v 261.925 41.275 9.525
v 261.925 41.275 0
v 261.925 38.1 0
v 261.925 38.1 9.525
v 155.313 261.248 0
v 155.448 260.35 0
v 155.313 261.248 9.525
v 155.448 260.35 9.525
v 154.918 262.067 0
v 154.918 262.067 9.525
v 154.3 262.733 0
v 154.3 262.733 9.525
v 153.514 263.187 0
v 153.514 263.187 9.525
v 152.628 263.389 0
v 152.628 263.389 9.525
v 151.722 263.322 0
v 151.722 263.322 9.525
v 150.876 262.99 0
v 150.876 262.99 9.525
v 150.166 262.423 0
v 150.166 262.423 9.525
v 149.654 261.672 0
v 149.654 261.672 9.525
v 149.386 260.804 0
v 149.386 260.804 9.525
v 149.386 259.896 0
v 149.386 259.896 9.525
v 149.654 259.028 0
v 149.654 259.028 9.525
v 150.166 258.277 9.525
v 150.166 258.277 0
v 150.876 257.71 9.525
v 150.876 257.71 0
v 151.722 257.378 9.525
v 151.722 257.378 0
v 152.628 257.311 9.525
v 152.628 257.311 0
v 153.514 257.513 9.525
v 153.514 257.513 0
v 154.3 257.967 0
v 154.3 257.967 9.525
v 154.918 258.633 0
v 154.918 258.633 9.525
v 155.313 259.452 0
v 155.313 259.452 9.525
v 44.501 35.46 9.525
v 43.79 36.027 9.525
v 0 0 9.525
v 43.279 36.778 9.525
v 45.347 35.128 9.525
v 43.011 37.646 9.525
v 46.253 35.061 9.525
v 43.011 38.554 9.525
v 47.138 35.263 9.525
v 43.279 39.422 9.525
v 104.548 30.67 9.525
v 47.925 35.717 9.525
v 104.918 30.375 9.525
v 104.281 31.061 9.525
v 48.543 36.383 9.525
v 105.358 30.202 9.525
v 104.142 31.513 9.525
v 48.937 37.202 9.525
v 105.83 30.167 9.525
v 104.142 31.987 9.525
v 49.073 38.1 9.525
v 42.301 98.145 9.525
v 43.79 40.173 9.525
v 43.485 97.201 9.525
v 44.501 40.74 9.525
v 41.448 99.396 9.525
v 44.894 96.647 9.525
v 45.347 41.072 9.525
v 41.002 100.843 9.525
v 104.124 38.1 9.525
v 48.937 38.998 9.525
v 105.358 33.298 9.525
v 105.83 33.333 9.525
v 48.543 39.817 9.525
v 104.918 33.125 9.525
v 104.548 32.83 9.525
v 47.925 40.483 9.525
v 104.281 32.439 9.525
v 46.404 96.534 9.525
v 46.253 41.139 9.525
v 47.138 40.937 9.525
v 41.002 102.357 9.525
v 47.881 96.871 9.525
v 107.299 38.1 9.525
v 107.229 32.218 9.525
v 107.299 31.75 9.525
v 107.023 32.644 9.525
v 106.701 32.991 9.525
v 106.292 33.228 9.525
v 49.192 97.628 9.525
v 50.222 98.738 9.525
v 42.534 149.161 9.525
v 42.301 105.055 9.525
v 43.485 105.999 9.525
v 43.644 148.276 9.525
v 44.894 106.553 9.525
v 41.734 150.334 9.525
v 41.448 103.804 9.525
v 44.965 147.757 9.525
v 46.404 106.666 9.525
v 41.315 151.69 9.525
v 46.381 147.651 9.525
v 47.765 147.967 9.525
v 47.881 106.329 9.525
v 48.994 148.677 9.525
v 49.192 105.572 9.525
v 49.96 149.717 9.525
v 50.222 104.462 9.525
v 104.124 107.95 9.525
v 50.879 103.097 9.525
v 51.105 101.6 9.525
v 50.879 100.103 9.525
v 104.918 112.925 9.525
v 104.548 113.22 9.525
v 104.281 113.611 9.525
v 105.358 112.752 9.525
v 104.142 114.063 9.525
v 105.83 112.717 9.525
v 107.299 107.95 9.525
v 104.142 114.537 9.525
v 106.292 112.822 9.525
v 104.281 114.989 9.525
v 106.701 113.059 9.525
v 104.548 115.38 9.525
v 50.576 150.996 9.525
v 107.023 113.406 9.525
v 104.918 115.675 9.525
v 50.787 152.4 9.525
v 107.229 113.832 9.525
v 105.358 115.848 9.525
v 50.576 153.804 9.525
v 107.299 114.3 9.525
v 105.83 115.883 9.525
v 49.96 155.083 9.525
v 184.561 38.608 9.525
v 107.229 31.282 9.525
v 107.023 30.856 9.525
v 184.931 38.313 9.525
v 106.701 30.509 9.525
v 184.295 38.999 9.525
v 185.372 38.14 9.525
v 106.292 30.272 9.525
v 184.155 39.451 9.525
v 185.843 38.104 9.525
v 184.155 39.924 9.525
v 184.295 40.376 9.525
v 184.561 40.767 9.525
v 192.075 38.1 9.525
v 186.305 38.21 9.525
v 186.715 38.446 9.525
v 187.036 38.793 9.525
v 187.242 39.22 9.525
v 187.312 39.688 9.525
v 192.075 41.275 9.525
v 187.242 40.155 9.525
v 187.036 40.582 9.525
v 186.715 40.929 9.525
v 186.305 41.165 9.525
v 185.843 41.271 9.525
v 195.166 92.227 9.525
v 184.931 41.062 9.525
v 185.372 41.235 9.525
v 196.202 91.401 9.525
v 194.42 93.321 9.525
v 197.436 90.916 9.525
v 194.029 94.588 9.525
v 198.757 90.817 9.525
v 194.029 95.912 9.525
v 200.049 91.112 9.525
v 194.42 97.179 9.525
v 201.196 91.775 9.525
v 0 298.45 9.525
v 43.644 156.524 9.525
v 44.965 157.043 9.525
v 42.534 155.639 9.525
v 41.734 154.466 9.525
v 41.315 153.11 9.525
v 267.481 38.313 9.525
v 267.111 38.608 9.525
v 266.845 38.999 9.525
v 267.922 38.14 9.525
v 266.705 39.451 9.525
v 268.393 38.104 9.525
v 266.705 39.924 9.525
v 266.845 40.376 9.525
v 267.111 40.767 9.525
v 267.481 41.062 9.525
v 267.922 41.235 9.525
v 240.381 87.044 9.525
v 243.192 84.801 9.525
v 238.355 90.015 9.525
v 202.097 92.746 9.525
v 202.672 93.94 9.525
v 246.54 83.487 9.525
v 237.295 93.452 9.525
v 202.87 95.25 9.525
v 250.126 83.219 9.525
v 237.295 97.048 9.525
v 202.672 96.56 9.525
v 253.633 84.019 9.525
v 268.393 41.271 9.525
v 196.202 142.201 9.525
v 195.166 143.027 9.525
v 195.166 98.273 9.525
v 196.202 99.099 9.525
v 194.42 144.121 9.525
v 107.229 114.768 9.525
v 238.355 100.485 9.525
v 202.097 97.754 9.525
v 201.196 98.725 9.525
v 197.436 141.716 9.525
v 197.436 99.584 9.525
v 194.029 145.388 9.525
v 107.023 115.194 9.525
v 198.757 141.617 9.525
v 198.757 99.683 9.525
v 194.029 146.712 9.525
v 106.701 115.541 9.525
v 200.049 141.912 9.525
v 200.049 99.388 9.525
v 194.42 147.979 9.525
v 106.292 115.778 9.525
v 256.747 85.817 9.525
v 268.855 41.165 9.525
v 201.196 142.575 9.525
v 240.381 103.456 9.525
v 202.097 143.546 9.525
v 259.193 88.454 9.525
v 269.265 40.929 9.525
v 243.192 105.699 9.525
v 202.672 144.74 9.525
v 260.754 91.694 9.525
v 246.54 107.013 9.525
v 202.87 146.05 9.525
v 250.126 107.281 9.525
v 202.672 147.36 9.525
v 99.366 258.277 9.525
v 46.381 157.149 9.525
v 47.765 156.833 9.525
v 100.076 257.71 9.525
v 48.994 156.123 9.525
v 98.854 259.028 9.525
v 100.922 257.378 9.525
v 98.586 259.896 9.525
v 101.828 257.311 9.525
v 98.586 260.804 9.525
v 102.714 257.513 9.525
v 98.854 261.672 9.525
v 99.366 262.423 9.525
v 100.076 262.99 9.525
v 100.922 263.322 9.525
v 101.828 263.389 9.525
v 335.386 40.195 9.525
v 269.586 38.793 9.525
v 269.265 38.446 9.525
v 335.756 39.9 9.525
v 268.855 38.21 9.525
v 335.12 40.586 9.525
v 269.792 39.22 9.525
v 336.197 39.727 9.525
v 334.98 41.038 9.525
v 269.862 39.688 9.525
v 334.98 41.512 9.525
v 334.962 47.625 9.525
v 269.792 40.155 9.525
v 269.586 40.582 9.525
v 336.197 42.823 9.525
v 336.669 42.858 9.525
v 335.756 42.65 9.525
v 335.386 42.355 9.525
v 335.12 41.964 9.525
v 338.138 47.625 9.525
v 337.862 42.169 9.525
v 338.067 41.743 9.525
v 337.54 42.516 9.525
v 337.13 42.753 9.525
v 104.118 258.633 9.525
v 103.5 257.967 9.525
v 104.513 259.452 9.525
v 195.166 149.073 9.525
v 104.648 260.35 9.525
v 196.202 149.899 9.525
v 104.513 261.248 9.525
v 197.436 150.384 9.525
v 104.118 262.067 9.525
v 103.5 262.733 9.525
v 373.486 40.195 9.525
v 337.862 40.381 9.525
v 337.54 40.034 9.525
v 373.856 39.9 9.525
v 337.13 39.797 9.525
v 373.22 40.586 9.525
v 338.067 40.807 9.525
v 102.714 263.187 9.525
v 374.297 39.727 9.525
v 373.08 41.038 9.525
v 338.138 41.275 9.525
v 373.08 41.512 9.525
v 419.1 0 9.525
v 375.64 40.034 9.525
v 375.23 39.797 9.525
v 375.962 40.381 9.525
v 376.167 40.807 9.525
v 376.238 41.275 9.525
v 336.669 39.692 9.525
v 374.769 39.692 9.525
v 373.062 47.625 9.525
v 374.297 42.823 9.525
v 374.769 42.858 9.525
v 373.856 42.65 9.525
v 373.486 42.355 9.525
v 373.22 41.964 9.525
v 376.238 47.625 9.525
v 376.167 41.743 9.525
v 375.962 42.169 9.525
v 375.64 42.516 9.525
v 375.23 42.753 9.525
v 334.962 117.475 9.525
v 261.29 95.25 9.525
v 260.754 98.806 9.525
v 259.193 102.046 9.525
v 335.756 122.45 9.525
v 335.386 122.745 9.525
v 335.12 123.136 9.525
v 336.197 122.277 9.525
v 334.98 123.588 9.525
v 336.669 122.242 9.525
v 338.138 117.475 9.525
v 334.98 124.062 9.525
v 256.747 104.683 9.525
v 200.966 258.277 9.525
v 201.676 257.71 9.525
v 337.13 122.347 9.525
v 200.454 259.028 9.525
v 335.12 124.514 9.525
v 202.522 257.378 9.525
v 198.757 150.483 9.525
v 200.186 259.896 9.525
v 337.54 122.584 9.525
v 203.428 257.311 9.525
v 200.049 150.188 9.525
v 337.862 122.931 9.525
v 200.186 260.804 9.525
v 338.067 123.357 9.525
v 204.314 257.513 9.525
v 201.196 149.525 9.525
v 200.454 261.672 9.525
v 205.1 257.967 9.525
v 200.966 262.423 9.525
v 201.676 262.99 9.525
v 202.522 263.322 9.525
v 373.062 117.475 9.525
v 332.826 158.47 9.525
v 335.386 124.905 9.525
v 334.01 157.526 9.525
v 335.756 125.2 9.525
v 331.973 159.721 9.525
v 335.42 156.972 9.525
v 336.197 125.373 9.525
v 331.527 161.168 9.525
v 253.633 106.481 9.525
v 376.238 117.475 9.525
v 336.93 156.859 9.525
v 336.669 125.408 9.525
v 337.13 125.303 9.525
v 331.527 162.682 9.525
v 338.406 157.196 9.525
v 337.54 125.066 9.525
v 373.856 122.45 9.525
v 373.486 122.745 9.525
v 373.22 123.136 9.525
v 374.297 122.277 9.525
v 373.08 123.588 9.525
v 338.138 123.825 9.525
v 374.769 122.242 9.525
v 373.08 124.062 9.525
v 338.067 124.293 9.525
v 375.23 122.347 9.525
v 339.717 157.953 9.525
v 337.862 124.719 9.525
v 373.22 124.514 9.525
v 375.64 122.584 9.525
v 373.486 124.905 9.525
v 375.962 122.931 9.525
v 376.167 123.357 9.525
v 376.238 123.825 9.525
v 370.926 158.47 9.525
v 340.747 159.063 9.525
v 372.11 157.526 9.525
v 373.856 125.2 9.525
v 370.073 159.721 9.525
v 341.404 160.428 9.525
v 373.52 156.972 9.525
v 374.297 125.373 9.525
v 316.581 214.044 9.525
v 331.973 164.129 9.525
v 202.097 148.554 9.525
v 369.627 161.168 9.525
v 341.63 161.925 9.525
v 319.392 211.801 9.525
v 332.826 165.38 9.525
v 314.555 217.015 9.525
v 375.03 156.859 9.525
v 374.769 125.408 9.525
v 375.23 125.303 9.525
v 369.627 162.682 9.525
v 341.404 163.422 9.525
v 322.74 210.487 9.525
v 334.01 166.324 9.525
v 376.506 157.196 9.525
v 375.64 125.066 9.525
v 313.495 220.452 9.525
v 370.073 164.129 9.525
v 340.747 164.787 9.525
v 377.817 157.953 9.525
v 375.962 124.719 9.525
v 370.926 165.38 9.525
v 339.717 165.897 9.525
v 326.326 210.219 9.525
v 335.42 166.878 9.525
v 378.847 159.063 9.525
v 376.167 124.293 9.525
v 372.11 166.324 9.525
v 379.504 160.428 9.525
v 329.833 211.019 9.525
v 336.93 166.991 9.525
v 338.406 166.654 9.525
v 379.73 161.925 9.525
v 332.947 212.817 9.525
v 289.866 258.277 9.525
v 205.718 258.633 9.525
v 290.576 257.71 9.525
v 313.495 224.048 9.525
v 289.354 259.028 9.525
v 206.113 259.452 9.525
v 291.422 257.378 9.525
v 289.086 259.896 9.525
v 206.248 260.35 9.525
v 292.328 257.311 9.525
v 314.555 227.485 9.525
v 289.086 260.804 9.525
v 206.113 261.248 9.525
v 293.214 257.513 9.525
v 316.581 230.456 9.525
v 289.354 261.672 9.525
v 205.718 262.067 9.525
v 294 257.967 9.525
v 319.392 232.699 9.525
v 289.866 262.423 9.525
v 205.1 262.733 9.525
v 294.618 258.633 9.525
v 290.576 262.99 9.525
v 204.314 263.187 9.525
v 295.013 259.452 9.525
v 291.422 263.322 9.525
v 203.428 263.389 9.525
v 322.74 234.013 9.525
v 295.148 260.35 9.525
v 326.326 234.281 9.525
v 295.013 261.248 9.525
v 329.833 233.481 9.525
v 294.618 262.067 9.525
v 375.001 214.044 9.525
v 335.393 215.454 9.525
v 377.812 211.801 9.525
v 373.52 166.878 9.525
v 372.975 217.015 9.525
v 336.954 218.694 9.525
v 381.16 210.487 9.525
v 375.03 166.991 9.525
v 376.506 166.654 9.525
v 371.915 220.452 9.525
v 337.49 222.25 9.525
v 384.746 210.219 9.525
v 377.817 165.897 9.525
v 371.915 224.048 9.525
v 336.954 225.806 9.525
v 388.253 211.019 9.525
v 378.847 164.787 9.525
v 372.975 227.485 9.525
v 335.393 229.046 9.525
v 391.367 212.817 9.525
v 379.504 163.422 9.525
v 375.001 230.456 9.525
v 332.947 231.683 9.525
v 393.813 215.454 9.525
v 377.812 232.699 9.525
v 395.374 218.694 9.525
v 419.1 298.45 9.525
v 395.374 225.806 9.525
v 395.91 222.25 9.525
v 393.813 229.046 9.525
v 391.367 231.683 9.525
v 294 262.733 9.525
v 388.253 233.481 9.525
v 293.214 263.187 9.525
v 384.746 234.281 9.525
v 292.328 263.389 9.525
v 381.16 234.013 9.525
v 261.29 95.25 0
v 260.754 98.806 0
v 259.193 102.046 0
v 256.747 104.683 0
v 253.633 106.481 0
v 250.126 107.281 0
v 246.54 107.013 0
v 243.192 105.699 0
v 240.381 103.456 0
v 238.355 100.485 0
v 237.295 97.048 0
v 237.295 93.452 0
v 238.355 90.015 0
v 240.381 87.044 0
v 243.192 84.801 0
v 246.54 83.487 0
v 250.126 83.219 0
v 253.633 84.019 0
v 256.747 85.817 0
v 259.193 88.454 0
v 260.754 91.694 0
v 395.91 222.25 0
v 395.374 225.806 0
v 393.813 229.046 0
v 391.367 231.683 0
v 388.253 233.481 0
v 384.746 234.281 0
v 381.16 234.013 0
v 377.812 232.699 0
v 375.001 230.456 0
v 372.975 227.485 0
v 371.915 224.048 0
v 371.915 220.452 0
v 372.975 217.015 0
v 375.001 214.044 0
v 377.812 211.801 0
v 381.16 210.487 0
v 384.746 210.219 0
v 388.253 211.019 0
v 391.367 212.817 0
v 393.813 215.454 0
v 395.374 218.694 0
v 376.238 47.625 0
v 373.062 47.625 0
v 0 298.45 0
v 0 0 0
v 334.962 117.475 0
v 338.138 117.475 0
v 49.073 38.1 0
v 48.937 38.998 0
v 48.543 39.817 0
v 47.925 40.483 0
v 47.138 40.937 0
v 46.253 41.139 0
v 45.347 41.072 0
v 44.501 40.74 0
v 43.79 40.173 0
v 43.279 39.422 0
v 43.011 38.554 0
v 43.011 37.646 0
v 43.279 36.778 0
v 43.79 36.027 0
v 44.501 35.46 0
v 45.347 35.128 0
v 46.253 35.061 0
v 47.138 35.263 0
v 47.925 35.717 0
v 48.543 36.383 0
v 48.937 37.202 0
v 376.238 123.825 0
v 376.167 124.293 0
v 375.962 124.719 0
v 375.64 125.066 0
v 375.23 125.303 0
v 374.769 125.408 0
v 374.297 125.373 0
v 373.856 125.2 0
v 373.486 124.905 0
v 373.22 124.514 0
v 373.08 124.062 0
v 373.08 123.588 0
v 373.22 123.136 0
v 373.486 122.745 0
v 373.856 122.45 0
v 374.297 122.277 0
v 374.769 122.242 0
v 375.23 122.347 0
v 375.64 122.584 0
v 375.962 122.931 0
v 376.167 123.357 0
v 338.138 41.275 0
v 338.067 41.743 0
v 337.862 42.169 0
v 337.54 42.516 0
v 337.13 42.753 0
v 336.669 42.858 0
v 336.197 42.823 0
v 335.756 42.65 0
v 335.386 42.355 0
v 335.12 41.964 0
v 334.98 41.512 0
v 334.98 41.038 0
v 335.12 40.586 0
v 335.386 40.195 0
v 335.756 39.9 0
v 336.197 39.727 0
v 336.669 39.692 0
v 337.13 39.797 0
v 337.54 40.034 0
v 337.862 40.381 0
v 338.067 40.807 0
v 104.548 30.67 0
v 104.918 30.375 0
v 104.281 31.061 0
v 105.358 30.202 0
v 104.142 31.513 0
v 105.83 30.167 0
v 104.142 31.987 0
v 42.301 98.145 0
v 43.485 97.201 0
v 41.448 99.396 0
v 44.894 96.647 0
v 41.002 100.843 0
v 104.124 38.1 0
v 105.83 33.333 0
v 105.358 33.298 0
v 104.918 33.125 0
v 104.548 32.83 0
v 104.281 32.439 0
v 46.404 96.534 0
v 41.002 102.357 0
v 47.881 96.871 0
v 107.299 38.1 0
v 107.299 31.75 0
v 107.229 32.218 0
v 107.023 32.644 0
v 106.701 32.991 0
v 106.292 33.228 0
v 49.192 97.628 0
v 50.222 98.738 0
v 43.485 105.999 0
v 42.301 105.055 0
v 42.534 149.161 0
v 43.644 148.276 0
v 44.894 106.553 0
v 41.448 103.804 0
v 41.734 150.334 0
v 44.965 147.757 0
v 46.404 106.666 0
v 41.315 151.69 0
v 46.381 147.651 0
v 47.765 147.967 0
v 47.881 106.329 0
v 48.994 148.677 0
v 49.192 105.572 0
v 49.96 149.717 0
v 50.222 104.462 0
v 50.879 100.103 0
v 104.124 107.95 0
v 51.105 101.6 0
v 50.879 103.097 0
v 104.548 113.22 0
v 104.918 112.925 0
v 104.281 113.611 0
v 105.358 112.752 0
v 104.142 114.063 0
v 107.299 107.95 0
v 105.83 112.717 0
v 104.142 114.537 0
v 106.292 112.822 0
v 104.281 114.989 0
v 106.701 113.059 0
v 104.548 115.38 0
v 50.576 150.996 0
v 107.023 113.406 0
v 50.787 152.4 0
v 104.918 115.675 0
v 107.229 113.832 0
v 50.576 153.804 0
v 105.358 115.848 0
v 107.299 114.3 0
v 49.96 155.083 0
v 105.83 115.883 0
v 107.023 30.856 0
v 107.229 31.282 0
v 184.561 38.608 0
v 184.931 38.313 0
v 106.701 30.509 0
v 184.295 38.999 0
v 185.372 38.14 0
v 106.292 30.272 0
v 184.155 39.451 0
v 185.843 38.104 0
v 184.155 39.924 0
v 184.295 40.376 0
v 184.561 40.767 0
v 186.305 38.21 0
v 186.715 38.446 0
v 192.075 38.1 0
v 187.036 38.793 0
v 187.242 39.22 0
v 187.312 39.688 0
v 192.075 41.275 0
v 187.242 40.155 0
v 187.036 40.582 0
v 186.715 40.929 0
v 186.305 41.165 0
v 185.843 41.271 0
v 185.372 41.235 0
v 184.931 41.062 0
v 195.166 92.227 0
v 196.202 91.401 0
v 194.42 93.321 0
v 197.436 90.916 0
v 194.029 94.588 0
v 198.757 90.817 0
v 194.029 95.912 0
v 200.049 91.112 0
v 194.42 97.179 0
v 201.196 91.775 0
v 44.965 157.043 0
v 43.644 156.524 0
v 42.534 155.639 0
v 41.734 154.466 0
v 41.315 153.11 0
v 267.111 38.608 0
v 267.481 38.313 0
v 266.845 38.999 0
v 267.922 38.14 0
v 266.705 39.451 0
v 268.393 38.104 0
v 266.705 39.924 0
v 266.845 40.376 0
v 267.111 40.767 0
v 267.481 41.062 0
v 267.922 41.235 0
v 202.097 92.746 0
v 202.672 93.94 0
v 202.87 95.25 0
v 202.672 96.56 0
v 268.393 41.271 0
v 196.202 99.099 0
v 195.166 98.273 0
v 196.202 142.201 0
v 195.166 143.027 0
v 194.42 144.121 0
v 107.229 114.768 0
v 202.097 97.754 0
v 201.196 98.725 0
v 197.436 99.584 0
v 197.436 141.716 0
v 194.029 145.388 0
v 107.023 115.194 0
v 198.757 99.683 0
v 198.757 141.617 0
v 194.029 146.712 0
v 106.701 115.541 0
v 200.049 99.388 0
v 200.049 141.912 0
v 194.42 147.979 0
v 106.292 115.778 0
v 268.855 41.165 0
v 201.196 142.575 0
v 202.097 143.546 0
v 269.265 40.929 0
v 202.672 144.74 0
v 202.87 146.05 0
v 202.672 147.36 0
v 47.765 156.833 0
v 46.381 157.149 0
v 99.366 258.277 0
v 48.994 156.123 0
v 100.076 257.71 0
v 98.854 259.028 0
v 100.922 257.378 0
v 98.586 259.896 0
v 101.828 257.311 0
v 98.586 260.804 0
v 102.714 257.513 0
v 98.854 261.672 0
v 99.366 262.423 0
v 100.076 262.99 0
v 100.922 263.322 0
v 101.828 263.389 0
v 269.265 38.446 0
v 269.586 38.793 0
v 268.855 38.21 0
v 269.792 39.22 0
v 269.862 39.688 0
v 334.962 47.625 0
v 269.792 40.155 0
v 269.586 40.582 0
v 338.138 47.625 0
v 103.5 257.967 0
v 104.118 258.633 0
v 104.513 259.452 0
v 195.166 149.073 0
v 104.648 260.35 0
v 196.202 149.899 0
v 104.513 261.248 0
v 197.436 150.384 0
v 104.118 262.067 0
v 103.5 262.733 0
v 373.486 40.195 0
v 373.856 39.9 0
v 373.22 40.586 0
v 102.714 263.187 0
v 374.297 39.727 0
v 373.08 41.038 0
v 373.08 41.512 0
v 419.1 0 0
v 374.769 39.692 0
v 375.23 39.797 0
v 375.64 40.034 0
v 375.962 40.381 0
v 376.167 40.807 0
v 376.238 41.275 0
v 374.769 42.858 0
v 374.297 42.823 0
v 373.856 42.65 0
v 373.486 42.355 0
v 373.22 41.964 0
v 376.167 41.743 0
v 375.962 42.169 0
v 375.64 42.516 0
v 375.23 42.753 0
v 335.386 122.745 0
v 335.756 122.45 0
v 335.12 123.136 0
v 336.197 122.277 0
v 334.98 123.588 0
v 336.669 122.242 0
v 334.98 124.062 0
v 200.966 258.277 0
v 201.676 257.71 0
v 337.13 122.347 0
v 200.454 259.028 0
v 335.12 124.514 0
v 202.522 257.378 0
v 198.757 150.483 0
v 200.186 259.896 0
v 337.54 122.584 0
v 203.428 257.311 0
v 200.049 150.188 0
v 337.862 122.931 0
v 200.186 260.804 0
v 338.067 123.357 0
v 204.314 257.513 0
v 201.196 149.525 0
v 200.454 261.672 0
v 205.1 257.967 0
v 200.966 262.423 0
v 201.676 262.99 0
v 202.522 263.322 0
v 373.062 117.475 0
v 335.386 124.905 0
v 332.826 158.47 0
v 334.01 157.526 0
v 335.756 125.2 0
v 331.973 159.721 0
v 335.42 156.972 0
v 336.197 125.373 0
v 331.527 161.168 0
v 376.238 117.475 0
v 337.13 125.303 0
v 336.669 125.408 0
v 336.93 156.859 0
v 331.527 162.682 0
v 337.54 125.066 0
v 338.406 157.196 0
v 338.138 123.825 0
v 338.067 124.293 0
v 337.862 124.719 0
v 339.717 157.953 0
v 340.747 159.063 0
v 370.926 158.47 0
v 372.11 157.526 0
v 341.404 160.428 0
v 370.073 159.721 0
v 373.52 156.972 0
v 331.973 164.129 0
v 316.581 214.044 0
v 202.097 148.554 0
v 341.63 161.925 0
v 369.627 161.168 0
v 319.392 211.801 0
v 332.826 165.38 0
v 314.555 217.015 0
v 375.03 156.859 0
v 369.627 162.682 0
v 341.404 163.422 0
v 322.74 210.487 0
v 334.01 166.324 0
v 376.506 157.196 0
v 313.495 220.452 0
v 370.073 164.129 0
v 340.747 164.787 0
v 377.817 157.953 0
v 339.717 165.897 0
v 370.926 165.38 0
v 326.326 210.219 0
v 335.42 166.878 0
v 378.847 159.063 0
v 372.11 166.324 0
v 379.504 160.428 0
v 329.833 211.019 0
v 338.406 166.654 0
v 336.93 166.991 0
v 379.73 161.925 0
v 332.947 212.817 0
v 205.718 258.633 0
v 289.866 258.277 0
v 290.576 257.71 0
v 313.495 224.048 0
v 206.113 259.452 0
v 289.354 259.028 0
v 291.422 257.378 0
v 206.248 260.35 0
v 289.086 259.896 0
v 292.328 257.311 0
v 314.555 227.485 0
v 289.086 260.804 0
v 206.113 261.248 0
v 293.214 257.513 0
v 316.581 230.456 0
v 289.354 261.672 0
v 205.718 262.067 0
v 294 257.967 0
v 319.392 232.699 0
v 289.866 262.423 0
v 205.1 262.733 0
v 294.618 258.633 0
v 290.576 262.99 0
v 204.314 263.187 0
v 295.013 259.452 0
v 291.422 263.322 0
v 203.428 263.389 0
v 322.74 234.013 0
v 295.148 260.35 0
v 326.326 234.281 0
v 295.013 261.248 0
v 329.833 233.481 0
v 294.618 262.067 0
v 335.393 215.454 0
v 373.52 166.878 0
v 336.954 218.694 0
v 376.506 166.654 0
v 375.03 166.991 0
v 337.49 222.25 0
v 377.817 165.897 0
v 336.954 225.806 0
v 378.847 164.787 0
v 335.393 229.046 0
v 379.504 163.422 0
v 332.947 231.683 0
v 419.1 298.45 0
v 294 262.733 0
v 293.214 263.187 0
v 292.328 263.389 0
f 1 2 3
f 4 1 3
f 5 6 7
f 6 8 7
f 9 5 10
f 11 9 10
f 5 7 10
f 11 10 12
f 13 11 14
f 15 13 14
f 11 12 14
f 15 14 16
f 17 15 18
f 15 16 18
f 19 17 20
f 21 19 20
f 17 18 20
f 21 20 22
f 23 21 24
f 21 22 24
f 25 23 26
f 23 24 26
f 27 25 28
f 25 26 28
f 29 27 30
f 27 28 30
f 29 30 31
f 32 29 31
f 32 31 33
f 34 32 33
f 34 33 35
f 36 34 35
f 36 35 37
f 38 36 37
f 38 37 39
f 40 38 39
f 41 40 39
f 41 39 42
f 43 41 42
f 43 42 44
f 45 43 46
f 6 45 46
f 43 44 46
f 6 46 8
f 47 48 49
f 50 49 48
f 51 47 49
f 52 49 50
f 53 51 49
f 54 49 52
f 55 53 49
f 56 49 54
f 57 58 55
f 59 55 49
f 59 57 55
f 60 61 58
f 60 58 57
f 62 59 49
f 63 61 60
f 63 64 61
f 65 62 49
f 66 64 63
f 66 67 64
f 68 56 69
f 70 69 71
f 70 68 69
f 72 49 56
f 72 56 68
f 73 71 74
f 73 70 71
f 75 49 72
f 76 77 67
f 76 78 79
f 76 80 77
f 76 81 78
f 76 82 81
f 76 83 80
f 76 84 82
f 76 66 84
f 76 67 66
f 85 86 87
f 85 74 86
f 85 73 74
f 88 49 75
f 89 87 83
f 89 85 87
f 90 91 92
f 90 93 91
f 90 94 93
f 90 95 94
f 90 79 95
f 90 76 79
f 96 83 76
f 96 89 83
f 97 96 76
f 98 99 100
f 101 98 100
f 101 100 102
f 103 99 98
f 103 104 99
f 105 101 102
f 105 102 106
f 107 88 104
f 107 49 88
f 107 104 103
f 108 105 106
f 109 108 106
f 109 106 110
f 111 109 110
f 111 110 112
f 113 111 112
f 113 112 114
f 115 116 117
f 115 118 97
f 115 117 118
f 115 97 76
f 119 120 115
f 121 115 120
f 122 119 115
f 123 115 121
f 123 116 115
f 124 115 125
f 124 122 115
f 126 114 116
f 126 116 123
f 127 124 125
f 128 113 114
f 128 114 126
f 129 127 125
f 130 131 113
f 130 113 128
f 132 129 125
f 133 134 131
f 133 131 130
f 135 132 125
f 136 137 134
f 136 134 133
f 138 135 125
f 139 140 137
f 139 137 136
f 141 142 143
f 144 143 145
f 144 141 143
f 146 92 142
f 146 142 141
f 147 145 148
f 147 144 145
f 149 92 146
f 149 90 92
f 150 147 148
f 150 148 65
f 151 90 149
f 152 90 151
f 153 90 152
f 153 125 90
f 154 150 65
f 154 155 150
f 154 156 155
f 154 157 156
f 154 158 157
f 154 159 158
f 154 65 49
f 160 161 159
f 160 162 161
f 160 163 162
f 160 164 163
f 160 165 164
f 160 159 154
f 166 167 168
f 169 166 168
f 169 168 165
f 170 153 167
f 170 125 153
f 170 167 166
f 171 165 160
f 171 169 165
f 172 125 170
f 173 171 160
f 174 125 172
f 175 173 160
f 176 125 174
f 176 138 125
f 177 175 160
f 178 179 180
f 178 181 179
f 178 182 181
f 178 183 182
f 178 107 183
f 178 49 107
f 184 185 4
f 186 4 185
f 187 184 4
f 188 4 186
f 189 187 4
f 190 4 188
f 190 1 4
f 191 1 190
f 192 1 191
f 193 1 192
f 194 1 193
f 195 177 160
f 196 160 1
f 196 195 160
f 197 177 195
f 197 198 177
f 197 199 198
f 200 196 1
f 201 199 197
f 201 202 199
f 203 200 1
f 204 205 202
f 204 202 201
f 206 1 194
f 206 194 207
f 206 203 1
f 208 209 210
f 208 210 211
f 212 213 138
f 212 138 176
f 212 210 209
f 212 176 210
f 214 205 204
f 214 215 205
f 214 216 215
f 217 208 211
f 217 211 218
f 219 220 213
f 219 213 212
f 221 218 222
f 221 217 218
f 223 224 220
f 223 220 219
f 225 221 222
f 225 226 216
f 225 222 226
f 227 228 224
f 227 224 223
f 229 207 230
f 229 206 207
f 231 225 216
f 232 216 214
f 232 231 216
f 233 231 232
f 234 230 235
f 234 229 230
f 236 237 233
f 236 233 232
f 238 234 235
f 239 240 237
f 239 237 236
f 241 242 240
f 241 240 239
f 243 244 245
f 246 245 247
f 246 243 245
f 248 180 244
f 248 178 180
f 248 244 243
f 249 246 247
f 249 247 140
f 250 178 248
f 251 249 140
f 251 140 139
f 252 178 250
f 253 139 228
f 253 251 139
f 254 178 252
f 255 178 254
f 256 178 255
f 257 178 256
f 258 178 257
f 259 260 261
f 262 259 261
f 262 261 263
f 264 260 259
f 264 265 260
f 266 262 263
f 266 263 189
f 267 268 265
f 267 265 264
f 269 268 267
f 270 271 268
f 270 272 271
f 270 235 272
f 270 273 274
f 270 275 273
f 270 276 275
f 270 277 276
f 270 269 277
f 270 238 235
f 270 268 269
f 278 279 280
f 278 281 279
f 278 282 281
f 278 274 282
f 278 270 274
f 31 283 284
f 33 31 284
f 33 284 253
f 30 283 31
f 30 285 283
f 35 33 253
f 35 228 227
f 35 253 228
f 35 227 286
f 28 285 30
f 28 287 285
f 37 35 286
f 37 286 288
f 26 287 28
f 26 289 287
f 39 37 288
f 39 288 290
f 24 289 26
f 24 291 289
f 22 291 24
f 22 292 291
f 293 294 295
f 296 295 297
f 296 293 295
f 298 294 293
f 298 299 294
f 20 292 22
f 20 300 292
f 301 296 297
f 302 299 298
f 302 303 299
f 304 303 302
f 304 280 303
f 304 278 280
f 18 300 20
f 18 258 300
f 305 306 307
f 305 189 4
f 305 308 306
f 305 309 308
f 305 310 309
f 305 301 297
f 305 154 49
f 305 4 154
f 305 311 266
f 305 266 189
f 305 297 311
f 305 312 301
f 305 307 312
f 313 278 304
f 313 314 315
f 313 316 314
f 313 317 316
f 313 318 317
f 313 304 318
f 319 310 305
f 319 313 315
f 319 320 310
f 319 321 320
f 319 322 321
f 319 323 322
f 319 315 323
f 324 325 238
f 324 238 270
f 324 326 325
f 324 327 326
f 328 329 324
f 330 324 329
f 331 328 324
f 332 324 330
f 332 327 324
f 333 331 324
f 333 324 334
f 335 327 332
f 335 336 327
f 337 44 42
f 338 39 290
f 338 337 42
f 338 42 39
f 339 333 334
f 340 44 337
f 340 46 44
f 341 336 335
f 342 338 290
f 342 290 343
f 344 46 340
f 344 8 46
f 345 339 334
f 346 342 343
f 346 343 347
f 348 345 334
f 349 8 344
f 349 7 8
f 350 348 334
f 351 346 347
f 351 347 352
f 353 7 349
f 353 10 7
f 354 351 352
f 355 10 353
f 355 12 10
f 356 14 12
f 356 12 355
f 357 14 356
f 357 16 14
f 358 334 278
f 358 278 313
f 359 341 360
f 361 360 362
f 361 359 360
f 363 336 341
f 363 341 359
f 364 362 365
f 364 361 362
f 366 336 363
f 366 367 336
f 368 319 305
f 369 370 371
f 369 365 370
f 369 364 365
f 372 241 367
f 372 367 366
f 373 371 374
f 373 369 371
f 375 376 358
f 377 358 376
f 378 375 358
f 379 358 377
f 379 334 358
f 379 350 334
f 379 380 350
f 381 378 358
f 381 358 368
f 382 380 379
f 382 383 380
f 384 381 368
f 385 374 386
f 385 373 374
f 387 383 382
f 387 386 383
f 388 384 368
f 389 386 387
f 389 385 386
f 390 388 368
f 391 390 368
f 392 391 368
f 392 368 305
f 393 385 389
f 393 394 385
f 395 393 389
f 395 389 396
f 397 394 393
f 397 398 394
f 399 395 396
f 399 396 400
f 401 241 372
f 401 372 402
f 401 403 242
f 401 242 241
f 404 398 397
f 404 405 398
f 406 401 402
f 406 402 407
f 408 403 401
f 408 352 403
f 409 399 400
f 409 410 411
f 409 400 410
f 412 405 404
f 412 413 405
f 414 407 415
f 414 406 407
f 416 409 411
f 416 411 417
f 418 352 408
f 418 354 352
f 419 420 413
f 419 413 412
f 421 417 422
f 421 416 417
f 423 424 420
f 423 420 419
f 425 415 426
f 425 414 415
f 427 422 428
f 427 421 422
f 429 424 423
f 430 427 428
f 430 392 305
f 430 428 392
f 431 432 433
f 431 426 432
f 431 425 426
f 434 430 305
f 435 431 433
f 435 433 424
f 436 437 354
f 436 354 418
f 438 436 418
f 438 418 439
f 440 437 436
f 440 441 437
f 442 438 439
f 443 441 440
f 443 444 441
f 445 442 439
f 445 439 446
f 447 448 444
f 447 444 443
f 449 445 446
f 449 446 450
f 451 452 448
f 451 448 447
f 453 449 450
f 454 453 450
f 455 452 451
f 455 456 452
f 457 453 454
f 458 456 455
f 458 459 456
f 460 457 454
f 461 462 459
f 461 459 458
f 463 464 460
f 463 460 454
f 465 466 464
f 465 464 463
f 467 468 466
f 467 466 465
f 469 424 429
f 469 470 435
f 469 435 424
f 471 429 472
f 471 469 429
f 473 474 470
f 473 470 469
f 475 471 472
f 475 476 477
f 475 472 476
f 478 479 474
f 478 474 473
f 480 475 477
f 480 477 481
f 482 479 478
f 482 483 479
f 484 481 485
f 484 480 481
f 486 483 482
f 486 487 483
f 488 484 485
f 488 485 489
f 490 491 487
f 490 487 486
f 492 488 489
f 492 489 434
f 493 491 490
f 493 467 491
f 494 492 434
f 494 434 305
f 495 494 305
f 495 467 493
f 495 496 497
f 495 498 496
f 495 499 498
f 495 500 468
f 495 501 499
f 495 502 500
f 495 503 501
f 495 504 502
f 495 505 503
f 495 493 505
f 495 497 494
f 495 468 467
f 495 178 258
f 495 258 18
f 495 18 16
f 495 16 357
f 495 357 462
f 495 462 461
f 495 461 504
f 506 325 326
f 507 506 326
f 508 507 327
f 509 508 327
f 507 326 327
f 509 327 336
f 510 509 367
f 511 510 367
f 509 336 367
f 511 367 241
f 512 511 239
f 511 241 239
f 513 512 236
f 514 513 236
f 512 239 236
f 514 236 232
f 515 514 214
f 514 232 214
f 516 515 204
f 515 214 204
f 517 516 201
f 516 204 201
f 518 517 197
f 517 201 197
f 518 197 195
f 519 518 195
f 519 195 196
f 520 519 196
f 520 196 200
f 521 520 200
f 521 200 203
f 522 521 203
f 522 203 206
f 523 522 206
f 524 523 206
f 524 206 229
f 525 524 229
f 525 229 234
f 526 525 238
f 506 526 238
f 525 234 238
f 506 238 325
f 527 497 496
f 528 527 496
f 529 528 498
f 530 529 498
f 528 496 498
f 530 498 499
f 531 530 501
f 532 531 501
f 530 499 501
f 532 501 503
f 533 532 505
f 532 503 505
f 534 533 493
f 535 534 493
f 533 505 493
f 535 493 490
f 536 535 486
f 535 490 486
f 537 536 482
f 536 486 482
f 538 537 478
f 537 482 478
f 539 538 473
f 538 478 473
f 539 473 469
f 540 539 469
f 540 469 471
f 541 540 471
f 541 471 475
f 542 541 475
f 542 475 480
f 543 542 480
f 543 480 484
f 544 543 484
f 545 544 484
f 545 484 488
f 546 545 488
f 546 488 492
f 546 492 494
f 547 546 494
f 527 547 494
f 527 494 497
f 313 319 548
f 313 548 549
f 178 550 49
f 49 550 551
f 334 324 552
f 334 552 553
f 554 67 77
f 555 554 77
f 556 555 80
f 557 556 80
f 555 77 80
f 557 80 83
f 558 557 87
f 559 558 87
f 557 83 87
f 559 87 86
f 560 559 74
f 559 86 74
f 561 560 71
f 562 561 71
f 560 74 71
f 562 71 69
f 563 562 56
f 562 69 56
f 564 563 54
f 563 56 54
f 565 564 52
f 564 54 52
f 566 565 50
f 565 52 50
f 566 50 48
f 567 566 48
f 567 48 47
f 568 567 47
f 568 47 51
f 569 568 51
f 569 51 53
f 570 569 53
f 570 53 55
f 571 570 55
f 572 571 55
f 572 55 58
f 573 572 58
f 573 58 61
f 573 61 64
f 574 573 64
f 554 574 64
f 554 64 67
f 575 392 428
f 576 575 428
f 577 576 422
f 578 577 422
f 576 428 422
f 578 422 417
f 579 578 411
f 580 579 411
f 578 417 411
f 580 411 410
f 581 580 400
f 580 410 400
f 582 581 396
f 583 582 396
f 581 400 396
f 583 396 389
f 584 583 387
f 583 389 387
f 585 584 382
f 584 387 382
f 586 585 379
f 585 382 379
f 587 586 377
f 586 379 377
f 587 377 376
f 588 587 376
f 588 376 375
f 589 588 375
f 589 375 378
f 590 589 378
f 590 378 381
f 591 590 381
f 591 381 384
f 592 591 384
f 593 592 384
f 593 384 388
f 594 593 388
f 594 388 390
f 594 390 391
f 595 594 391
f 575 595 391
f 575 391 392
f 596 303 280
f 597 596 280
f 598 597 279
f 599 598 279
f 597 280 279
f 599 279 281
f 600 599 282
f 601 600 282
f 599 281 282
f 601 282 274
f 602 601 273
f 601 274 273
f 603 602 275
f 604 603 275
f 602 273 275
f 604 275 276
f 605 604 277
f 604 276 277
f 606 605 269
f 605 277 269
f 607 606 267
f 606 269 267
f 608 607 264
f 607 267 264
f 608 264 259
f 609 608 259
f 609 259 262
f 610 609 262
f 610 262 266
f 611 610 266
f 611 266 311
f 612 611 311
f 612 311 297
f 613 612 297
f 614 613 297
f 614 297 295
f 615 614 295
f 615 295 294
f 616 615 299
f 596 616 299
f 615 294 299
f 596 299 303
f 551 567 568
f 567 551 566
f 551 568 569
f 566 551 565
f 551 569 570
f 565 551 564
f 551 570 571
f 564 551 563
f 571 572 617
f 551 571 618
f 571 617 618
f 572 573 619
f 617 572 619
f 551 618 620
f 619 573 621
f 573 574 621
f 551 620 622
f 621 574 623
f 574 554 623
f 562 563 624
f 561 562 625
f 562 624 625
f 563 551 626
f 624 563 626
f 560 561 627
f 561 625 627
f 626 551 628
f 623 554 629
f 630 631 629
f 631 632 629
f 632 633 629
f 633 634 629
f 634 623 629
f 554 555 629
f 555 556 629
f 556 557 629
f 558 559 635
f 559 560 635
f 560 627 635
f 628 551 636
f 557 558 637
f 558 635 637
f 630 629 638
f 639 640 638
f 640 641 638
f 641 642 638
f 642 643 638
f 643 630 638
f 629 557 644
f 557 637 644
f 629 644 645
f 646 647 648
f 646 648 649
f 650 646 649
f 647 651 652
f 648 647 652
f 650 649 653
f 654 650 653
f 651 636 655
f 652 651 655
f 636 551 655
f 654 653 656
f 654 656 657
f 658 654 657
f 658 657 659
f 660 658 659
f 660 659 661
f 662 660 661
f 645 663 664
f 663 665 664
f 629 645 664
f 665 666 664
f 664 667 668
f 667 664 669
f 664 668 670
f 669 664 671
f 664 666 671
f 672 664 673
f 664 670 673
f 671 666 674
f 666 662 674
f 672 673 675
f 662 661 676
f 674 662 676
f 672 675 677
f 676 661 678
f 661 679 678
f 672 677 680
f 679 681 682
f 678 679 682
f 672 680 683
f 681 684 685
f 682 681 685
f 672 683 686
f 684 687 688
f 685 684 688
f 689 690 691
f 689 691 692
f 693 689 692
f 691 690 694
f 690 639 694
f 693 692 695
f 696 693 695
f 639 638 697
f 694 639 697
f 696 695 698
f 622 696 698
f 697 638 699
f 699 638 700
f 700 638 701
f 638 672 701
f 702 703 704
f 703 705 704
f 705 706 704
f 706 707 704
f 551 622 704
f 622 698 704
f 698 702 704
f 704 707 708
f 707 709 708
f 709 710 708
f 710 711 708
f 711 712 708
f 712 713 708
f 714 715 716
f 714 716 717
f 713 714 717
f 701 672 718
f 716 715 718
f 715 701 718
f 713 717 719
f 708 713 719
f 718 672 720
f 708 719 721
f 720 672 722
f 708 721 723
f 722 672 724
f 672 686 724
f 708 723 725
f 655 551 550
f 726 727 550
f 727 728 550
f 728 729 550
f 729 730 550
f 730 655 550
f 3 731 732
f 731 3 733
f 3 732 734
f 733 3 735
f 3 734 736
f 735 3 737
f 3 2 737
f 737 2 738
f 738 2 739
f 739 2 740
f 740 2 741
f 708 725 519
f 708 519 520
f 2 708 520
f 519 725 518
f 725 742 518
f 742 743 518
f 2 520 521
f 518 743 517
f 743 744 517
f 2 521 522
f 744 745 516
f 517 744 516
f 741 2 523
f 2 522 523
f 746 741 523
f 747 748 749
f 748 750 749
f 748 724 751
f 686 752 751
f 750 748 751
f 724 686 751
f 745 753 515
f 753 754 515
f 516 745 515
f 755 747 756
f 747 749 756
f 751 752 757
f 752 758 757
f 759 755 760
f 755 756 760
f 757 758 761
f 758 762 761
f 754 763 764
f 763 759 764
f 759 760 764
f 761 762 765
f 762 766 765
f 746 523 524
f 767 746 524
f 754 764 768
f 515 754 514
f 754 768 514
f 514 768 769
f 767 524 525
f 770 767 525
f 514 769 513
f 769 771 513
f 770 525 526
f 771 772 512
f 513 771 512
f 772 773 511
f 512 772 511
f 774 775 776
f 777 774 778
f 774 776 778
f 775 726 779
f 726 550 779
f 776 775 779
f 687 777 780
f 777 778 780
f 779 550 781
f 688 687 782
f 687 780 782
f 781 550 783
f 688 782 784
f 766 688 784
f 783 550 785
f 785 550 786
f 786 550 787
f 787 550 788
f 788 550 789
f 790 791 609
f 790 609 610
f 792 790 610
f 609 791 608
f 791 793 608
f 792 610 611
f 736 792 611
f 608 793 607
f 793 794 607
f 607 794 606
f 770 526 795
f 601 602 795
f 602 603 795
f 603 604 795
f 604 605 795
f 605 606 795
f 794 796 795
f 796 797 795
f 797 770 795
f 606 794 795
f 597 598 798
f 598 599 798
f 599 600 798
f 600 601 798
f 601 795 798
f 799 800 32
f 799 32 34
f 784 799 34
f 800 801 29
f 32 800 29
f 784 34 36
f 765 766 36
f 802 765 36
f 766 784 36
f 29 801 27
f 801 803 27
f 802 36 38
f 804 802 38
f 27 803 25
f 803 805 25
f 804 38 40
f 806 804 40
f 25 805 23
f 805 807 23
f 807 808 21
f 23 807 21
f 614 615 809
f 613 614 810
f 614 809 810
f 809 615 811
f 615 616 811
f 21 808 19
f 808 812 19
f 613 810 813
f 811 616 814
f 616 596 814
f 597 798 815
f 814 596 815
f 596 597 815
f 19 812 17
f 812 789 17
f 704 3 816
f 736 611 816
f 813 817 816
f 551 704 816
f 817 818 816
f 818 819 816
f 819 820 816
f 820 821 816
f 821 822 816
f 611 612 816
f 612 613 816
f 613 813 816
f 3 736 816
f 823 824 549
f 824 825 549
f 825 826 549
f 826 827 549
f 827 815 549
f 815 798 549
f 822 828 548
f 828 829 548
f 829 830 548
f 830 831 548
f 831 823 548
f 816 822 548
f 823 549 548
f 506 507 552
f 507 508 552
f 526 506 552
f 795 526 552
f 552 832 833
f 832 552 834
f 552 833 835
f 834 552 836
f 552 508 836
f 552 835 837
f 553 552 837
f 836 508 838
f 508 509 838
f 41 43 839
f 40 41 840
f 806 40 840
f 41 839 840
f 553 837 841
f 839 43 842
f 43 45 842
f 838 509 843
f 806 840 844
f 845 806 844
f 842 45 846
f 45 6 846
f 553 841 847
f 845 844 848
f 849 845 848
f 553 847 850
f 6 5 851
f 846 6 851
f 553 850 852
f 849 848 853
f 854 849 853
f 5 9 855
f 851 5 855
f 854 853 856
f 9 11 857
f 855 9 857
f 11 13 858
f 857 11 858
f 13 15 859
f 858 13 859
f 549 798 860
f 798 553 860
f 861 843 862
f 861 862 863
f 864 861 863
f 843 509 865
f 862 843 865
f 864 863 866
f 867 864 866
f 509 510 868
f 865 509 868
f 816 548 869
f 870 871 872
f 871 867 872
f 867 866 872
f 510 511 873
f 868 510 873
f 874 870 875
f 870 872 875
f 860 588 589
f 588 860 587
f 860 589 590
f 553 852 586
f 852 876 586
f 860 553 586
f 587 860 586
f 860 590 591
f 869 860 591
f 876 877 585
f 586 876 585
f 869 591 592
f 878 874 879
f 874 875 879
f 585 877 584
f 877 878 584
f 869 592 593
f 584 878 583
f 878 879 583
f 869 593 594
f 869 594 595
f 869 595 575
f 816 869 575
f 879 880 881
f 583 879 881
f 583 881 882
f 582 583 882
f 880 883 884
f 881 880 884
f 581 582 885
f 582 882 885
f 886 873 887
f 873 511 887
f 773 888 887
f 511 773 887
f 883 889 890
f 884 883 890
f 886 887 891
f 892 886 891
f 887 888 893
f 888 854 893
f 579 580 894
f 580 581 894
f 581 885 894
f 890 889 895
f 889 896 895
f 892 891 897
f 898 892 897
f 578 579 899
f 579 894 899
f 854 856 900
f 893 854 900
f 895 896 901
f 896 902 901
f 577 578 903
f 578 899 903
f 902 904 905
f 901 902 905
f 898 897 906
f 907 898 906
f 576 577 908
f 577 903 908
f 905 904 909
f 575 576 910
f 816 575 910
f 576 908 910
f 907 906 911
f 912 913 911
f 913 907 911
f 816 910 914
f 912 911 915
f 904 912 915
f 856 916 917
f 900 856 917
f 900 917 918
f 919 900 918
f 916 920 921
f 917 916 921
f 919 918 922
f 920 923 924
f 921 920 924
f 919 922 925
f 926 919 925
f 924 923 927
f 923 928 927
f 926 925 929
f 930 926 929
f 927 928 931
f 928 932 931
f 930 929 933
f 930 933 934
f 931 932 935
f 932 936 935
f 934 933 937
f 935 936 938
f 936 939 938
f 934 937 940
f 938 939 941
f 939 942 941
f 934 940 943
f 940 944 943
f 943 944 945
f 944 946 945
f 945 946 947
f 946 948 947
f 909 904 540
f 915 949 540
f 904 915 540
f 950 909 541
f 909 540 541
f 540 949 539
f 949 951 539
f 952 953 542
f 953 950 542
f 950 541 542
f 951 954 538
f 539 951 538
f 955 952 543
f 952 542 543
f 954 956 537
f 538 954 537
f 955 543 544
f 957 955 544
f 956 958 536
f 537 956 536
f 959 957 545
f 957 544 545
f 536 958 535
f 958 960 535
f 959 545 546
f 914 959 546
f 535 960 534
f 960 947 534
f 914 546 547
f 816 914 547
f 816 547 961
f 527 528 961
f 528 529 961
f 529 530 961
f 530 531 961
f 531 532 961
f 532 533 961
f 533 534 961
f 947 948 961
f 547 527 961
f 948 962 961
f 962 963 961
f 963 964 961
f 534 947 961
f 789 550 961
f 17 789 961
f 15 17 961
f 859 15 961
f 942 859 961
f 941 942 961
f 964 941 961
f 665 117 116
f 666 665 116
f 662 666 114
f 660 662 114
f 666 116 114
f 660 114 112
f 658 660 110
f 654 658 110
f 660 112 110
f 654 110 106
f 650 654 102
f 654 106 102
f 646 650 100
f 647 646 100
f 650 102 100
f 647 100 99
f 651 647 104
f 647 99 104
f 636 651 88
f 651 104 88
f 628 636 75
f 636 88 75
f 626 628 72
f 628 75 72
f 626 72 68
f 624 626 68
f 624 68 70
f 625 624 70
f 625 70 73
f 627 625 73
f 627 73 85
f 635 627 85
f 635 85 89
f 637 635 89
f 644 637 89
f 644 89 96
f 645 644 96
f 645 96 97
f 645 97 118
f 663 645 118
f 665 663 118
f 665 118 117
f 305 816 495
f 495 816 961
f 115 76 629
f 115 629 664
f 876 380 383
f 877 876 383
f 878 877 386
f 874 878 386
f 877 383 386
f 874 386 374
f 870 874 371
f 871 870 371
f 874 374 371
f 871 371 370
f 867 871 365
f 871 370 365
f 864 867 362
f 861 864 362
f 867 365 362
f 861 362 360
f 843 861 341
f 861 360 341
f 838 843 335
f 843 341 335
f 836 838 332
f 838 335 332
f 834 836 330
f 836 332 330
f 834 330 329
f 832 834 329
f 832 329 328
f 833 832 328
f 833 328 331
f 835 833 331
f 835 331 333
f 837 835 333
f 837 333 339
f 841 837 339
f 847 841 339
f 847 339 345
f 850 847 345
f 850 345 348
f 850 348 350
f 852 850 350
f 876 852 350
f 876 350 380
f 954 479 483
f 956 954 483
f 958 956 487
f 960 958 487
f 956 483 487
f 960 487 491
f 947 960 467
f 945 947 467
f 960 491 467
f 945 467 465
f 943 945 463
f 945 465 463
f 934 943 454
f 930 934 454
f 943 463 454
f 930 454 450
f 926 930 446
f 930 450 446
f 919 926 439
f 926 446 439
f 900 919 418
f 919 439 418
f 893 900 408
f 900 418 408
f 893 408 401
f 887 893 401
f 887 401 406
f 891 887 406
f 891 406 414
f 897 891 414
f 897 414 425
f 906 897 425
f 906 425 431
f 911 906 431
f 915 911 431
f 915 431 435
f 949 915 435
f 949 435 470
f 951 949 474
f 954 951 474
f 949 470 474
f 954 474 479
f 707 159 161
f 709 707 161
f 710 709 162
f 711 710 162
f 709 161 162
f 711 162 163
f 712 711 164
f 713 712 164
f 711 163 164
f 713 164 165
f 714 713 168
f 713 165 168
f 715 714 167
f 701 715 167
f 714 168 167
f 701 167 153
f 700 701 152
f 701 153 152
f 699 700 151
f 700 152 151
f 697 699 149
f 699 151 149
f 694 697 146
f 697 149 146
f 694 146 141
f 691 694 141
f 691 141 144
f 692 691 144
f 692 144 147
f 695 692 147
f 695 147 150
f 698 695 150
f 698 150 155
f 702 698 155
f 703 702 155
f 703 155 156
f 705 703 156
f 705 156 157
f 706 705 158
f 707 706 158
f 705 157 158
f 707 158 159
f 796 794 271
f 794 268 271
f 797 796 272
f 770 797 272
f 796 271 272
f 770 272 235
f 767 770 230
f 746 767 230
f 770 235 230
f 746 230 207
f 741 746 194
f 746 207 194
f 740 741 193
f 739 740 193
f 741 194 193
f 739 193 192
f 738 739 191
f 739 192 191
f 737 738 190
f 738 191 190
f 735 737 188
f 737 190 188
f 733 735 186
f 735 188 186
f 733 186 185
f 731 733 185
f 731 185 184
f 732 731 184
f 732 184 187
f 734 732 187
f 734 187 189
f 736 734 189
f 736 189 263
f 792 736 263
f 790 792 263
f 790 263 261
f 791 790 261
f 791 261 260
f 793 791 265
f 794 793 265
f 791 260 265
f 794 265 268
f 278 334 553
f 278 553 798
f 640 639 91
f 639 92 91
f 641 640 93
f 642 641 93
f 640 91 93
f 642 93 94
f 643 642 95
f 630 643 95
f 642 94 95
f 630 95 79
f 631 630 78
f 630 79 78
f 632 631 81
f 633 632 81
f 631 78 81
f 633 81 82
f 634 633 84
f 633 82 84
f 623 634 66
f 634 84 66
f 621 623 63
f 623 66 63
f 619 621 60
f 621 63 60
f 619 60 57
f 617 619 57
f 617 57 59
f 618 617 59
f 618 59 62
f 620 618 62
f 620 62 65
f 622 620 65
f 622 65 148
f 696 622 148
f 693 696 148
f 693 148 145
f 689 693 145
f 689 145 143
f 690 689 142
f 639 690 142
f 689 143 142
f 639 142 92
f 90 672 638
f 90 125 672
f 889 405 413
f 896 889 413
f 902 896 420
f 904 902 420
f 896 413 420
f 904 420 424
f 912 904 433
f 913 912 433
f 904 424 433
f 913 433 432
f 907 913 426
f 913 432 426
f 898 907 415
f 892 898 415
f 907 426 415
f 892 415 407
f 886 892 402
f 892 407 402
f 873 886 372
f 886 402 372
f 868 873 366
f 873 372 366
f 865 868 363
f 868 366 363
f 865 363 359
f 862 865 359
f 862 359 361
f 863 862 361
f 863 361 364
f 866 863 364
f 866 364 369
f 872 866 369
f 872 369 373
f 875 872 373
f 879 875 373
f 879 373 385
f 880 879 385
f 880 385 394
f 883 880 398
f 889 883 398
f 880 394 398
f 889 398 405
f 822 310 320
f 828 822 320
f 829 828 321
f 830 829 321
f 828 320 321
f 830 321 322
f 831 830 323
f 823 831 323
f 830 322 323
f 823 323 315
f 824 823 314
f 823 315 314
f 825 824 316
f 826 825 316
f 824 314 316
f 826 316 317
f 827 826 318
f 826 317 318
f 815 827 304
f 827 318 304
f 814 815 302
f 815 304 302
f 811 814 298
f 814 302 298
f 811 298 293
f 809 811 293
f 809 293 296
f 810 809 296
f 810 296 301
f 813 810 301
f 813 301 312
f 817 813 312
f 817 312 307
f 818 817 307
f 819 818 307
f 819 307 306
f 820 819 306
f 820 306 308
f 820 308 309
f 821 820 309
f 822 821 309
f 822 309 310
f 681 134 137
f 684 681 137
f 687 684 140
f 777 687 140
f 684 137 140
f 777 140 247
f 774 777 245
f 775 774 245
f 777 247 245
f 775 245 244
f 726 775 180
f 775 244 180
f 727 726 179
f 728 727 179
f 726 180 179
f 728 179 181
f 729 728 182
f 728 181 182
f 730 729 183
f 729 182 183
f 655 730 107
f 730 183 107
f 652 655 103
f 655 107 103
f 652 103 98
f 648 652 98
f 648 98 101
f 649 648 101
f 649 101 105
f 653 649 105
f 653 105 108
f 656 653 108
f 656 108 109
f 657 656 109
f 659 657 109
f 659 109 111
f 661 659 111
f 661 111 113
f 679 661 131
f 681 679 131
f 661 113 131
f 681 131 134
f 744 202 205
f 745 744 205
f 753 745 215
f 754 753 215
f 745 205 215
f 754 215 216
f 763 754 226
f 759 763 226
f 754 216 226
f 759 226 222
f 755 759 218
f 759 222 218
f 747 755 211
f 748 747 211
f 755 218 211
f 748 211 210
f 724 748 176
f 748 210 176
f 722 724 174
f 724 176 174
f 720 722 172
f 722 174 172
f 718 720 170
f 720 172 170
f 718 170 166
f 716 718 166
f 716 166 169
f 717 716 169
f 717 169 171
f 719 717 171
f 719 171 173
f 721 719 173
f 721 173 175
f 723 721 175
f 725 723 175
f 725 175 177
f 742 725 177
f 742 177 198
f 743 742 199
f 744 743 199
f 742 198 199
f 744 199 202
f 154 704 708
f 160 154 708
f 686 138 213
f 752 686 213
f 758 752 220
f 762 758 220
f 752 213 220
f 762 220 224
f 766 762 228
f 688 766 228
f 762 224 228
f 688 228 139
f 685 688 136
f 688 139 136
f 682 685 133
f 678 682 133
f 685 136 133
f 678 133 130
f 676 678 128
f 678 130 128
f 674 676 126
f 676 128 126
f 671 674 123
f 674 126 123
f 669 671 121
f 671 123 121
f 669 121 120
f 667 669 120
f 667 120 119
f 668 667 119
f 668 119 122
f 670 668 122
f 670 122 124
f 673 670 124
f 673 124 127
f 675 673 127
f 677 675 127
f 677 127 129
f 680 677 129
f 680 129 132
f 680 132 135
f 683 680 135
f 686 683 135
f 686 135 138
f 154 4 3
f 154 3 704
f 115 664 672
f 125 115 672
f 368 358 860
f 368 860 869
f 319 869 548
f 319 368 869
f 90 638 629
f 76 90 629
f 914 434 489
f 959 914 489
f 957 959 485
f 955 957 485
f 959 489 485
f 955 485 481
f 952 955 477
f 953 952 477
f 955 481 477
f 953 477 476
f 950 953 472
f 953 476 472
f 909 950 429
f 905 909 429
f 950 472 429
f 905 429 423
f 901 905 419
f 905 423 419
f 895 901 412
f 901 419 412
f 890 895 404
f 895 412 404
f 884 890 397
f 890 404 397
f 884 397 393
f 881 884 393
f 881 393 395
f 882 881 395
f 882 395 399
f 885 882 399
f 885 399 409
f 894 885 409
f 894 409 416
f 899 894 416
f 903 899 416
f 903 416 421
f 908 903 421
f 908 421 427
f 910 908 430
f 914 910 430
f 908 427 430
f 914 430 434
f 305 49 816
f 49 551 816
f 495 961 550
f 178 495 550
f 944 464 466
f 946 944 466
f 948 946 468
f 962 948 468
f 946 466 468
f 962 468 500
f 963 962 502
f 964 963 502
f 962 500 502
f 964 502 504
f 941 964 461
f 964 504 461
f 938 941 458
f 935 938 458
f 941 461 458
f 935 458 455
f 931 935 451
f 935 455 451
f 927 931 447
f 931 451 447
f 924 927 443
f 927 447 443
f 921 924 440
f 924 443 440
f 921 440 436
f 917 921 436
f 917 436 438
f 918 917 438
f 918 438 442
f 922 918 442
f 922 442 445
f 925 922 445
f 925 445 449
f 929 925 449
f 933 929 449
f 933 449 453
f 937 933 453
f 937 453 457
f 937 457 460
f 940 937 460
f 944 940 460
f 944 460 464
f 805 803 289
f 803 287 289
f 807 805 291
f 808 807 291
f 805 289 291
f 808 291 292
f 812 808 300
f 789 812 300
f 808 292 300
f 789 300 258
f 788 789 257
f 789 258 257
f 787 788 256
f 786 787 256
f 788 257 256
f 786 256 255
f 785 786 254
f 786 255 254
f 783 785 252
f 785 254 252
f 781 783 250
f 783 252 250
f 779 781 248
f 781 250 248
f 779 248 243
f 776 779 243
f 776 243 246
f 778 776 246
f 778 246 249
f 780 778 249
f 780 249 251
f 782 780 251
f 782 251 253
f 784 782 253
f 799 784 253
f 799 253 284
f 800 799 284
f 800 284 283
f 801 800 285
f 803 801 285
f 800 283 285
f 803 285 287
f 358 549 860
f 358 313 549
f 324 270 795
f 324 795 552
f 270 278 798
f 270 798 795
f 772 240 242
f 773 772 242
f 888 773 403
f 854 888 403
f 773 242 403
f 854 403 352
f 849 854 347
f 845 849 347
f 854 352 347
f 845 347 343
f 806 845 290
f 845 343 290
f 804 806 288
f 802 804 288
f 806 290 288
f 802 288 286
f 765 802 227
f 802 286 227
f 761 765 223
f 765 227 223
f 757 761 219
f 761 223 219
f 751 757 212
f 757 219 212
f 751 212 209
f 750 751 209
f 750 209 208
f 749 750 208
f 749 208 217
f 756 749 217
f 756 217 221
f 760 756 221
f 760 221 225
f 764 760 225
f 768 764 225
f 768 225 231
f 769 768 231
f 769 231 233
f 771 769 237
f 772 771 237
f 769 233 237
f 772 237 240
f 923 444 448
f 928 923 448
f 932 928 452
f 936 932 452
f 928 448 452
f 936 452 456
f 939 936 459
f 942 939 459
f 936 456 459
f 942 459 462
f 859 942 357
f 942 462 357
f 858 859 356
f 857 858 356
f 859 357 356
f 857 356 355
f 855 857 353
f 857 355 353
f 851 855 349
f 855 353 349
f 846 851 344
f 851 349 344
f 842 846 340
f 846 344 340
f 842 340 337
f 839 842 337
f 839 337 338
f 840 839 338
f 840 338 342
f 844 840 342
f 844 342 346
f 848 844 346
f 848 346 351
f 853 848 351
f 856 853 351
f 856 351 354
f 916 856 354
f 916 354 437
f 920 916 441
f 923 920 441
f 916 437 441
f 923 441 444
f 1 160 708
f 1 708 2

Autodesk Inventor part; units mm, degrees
ref_plane "YZ Plane" through (0, 0, 0) normal (1, 0, 0) x (0, 1, 0)
ref_plane "XZ Plane" through (0, 0, 0) normal (0, 1, 0) x (-1, 0, 0)
ref_plane "XY Plane" through (0, 0, 0) normal (0, 0, 1) x (1, 0, 0)
sketch "Sketch1" plane through (0, 0, 0) normal (0, 0, 1) x (1, 0, 0)
  line L0 (0, 0) -> (419.1, 0)
  line L1 (419.1, 0) -> (419.1, 298.45)
  line L2 (419.1, 298.45) -> (0, 298.45)
  line L3 (0, 298.45) -> (0, 0)
  dimension "d0" = 419.1
  dimension "d1" = 298.45
extrude "Extrusion1" add sketch "Sketch1" along normal blind 9.525
sketch "Sketch2" plane through (0, 0, 9.525) normal (0, 0, 1) x (1, 0, 0)
  line L0 (373.0625, 117.475) -> (376.2375, 117.475)
  line L1 (376.2375, 117.475) -> (376.2375, 47.625)
  line L2 (376.2375, 47.625) -> (373.0625, 47.625)
  line L3 (373.0625, 47.625) -> (373.0625, 117.475)
  line L4 (0, 0) -> (419.1, 0) projected
  line L5 (419.1, 0) -> (419.1, 298.45) projected
  circle A0 centre (374.65, 41.275) radius 1.5875
  circle A1 centre (374.65, 123.825) radius 1.5875
  circle A2 centre (374.65, 161.925) radius 5.08
  circle A3 centre (336.55, 41.275) radius 1.5875
  line L6 (338.1375, 47.625) -> (334.9625, 47.625)
  line L7 (334.9625, 47.625) -> (334.9625, 117.475)
  line L8 (334.9625, 117.475) -> (338.1375, 117.475)
  line L9 (338.1375, 117.475) -> (338.1375, 47.625)
  circle A4 centre (336.55, 123.825) radius 1.5875
  circle A5 centre (336.55, 161.925) radius 5.08
  circle A6 centre (383.8448, 222.25) radius 12.065
  circle A7 centre (325.4248, 222.25) radius 12.065
  line L10 (299.4225, 0) -> (299.4225, 298.45)
  dimension "d4" = 3.175
  dimension "d5" = 69.85
  dimension "d6" = 47.625
  dimension "d7" = 42.8625
  dimension "d8" = 3.175
  dimension "d9" = 6.35
  dimension "d10" = 3.175
  dimension "d11" = 6.35
  dimension "d12" = 10.16
  dimension "d13" = 38.1
  dimension "d16" = 3.175
  dimension "d17" = 38.1
  dimension "d18" = 69.85
  dimension "d19" = 3.175
  dimension "d20" = 10.16
  dimension "d23" = 24.13
  dimension "d24" = 35.2552
  dimension "d25" = 93.6752
  dimension "d26" = 58.42
  dimension "d27" = 60.325
extrude "Extrusion2" cut sketch "Sketch2" against normal blind 9.525
sketch "Sketch3" plane through (0, 0, 9.525) normal (0, 0, 1) x (1, 0, 0)
  point P0 (0, 0)
sketch "Sketch4" plane through (0, 0, 9.525) normal (0, 0, 1) x (1, 0, 0)
  line L0 (419.1, 298.45) -> (0, 298.45) projected
  line L1 (287.3248, 298.45) -> (287.3248, 0)
  line L2 (0, 0) -> (419.1, 0) projected
  circle A0 centre (325.4248, 222.25) radius 12.065 projected
  line L3 (261.9248, 38.1) -> (192.0748, 38.1)
  line L4 (192.0748, 38.1) -> (192.0748, 41.275)
  line L5 (192.0748, 41.275) -> (261.9248, 41.275)
  line L6 (261.9248, 41.275) -> (261.9248, 38.1)
  circle A1 centre (185.7248, 39.6875) radius 1.5875
  circle A2 centre (268.2748, 39.6875) radius 1.5875
  circle A3 centre (249.2248, 95.25) radius 12.065
  circle A4 centre (198.4248, 95.25) radius 4.445
  circle A5 centre (198.4248, 146.05) radius 4.445
  dimension "d30" = 38.1
  dimension "d31" = 69.85
  dimension "d32" = 3.175
  dimension "d33" = 38.1
  dimension "d34" = 25.4
  dimension "d35" = 6.35
  dimension "d36" = 6.35
  dimension "d37" = 24.13
  dimension "d38" = 95.25
  dimension "d39" = 38.1
  dimension "d68" = 8.89
  dimension "d69" = 50.8
  dimension "d70" = 8.89
  dimension "d71" = 50.8
extrude "Extrusion3" cut sketch "Sketch4" against normal blind 9.525 contours L3 L4 L5 L6 | A1 | A2 | A3 | A4 | A5
sketch "Sketch5" plane through (0, 0, 9.525) normal (0, 0, 1) x (1, 0, 0)
  line L0 (0, 0) -> (419.1, 0) projected
  line L1 (147.6248, 0) -> (147.6248, 296.9243)
  line L2 (261.9248, 41.275) -> (261.9248, 38.1) projected
  line L3 (104.1241, 107.95) -> (107.2991, 107.95)
  line L4 (107.2991, 107.95) -> (107.2991, 38.1)
  line L5 (107.2991, 38.1) -> (104.1241, 38.1)
  line L6 (104.1241, 38.1) -> (104.1241, 107.95)
  circle A0 centre (105.7116, 31.75) radius 1.5875
  circle A1 centre (105.7116, 114.3) radius 1.5875
  circle A2 centre (46.0248, 101.6) radius 5.08
  circle A3 centre (46.0248, 38.1) radius 3.048
  line L7 (419.1, 298.45) -> (0, 298.45) projected
  line L8 (292.8764, 298.45) -> (292.8764, 0)
  circle A4 centre (46.0248, 152.4) radius 4.7625
  dimension "d42" = 114.3
  dimension "d43" = 3.175
  dimension "d44" = 69.85
  dimension "d45" = 38.1
  dimension "d46" = 3.175
  dimension "d47" = 6.35
  dimension "d48" = 3.175
  dimension "d49" = 6.35
  dimension "d50" = 10.16
  dimension "d51" = 101.6
  dimension "d52" = 101.6
  dimension "d53" = 6.096
  dimension "d72" = 9.525
  dimension "d73" = 50.8
sketch "Sketch6" plane through (0, 0, 9.525) normal (0, 0, 1) x (1, 0, 0)
  line L0 (0, 222.25) -> (296.6633, 222.25)
  line L1 (419.1, 298.45) -> (0, 298.45) projected
  circle A0 centre (101.6, 260.35) radius 3.048
  line L2 (0, 298.45) -> (0, 0) projected
  circle A1 centre (152.4, 260.35) radius 3.048
  circle A2 centre (203.2, 260.35) radius 3.048
  circle A3 centre (292.1, 260.35) radius 3.048
  dimension "d54" = 76.2
  dimension "d55" = 6.096
  dimension "d56" = 101.6
  dimension "d57" = 38.1
  dimension "d58" = 6.096
  dimension "d59" = 50.8
  dimension "d60" = 6.096
  dimension "d61" = 50.8
  dimension "d62" = 6.096
  dimension "d63" = 88.9
extrude "Extrusion4" cut sketch "Sketch5" against normal blind 9.525
extrude "Extrusion5" cut sketch "Sketch6" against normal blind 9.525
properties part number "driver station 1.0"
